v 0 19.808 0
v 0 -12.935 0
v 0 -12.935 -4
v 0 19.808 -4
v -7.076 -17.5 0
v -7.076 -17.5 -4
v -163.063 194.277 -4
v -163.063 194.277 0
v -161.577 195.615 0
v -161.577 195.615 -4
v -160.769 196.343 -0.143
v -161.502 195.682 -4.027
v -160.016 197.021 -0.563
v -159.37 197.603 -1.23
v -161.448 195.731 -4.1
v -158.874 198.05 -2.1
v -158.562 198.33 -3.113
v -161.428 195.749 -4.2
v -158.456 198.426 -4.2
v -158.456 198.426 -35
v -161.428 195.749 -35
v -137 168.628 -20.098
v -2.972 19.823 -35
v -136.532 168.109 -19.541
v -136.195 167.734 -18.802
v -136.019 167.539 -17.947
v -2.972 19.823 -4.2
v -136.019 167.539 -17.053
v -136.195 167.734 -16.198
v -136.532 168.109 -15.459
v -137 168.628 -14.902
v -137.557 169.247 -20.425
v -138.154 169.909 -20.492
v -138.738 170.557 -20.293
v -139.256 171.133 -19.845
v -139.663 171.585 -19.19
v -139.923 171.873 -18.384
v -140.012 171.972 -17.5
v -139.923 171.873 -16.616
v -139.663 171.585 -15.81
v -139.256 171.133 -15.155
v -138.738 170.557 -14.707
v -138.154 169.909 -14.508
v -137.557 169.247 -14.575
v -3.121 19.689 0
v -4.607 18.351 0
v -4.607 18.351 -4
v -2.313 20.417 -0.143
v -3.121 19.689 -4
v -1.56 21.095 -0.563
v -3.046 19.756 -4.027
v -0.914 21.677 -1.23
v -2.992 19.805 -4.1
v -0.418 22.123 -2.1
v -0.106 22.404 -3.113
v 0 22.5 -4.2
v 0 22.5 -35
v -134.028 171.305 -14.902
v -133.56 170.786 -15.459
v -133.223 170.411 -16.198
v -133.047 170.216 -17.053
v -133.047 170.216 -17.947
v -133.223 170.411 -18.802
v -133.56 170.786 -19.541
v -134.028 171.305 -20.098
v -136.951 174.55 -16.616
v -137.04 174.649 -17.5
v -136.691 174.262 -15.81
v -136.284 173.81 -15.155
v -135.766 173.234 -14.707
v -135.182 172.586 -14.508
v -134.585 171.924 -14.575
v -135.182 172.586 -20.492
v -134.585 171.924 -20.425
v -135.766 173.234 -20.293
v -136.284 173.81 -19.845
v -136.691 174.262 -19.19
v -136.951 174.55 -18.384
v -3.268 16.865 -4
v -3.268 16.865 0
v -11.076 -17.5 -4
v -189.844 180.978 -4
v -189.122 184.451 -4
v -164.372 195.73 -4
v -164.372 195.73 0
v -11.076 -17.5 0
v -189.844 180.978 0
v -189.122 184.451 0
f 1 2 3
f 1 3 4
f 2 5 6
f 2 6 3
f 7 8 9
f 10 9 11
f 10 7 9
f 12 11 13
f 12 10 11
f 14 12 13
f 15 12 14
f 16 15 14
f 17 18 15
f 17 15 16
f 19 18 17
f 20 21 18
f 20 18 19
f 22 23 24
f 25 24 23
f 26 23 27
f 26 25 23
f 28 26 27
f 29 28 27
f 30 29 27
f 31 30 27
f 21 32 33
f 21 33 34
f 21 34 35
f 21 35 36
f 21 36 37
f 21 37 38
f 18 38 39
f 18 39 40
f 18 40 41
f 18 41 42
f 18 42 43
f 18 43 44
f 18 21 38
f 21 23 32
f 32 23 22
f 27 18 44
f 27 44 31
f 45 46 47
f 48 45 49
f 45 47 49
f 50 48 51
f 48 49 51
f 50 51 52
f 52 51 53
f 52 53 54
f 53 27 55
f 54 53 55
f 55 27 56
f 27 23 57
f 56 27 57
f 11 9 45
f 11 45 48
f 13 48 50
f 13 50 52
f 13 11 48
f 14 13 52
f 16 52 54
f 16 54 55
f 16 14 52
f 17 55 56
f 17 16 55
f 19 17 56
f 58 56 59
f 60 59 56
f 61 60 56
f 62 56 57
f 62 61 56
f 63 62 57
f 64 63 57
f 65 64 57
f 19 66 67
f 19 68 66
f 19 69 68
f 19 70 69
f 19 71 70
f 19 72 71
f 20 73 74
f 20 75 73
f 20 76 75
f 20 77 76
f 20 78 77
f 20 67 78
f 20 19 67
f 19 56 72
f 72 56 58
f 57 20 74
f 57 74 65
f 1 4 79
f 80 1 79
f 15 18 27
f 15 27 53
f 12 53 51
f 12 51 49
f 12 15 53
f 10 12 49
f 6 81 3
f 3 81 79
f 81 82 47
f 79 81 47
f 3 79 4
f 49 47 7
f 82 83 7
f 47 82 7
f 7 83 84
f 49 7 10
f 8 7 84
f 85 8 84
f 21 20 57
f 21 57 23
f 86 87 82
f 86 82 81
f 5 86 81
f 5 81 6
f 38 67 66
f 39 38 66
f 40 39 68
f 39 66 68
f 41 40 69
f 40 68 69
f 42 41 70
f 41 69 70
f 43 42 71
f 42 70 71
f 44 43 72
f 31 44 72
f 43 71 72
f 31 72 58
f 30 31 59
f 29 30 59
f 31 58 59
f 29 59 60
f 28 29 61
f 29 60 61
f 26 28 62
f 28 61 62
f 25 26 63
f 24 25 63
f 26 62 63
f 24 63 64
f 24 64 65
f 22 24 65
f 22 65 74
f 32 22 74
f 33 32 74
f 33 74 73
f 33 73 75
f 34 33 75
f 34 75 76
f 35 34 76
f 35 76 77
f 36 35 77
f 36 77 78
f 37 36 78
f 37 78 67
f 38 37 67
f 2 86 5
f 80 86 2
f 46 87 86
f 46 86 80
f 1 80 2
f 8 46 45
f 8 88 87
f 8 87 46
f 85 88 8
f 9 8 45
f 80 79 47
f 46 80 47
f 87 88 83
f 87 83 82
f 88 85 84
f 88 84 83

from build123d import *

# Parameters (mm, degrees)
BASE_FLANGE1_DEPTH            = 4
EDGE_FLANGE1_STRIP_W          = 16.4
EDGE_FLANGE1_STRIP_H          = 4
EDGE_FLANGE1_STRIP_CUT_DEPTH  = 236.766242904
EDGE_FLANGE1_RELIEF_W         = 18.4
EDGE_FLANGE1_RELIEF_H         = 2
EDGE_FLANGE1_RELIEF_CUT_DEPTH = 4
EDGE_FLANGE1_DEPTH            = 236.766242904
SKETCH9_R                     = 3
CUT_EXTRUDE1_DEPTH            = 10


# Sheet-metal steps are written as plain solids
with BuildPart() as part:
    # Sketch1 → Base-Flange1 (new body)
    with BuildSketch(Plane.XY):
        Polygon((0, 22.5), (-158.455818563, 198.426141726), (-189.121858967, 184.45082196), (-189.843992647, 180.977630435), (-11.076158097, -17.5), (-7.076158097, -17.5), (0, -12.935441332), align=None)
    extrude(amount=-BASE_FLANGE1_DEPTH)

    # Edge-Flange1 strip (across the edge) → Edge-Flange1 strip cut (cut)
    with BuildSketch(Plane(origin=(-158.455818563, 198.426141726, -4), x_dir=(-0.7430372656499554, -0.6692500443447409, -3.4914813388431334e-15), z_dir=(0.6692500443447409, -0.7430372656499554, 0))):
        with Locations((-4, -2)):
            Rectangle(EDGE_FLANGE1_STRIP_W, EDGE_FLANGE1_STRIP_H)
    extrude(amount=EDGE_FLANGE1_STRIP_CUT_DEPTH, mode=Mode.SUBTRACT)

    # Edge-Flange1 relief (on the sheet) → Edge-Flange1 relief cut (cut)
    with BuildSketch(Plane(origin=(-161.576575079, 195.615291539, -4), x_dir=(-0.7430372656499554, -0.6692500443447409, -6.982962677686267e-15), z_dir=(0, 0, -1))):
        with Locations((-7.2, 1)):
            Rectangle(EDGE_FLANGE1_RELIEF_W, EDGE_FLANGE1_RELIEF_H)
        with Locations((-7.2, -237.766242904)):
            Rectangle(EDGE_FLANGE1_RELIEF_W, EDGE_FLANGE1_RELIEF_H)
    extrude(amount=-EDGE_FLANGE1_RELIEF_CUT_DEPTH, mode=Mode.SUBTRACT)

    # Edge-Flange1 section (across the edge) → Edge-Flange1 (add)
    with BuildSketch(Plane(origin=(-158.455818563, 198.426141726, -4), x_dir=(-0.7430372656499554, -0.6692500443447409, -3.4914813388431334e-15), z_dir=(0.6692500443447409, -0.7430372656499554, 0))):
        with BuildLine():
            Line((0, 0.2), (0, 31))
            Line((0, 31), (4, 31))
            Line((4, 31), (4, 0.2))
            ThreePointArc((4, 0.2), (4.058578644, 0.058578644), (4.2, 0))
            Line((4.2, 0), (4.2, -4))
            ThreePointArc((4.2, -4), (1.230151519, -2.769848481), (0, 0.2))
        make_face()
    extrude(amount=EDGE_FLANGE1_DEPTH)

    # Sketch9 → Cut-Extrude1 (cut)
    with BuildSketch(Plane(origin=(11.188748767, 10.077651492, 0), x_dir=(0, 0, -1), z_dir=(0.7430372656499554, 0.6692500443447409, -3.560476072298782e-15))):
        with Locations(Location((17.5, 218.484581381, 0), (0, 0, 90))):
            Circle(SKETCH9_R)
    extrude(amount=-CUT_EXTRUDE1_DEPTH, mode=Mode.SUBTRACT)


solid = part.part
